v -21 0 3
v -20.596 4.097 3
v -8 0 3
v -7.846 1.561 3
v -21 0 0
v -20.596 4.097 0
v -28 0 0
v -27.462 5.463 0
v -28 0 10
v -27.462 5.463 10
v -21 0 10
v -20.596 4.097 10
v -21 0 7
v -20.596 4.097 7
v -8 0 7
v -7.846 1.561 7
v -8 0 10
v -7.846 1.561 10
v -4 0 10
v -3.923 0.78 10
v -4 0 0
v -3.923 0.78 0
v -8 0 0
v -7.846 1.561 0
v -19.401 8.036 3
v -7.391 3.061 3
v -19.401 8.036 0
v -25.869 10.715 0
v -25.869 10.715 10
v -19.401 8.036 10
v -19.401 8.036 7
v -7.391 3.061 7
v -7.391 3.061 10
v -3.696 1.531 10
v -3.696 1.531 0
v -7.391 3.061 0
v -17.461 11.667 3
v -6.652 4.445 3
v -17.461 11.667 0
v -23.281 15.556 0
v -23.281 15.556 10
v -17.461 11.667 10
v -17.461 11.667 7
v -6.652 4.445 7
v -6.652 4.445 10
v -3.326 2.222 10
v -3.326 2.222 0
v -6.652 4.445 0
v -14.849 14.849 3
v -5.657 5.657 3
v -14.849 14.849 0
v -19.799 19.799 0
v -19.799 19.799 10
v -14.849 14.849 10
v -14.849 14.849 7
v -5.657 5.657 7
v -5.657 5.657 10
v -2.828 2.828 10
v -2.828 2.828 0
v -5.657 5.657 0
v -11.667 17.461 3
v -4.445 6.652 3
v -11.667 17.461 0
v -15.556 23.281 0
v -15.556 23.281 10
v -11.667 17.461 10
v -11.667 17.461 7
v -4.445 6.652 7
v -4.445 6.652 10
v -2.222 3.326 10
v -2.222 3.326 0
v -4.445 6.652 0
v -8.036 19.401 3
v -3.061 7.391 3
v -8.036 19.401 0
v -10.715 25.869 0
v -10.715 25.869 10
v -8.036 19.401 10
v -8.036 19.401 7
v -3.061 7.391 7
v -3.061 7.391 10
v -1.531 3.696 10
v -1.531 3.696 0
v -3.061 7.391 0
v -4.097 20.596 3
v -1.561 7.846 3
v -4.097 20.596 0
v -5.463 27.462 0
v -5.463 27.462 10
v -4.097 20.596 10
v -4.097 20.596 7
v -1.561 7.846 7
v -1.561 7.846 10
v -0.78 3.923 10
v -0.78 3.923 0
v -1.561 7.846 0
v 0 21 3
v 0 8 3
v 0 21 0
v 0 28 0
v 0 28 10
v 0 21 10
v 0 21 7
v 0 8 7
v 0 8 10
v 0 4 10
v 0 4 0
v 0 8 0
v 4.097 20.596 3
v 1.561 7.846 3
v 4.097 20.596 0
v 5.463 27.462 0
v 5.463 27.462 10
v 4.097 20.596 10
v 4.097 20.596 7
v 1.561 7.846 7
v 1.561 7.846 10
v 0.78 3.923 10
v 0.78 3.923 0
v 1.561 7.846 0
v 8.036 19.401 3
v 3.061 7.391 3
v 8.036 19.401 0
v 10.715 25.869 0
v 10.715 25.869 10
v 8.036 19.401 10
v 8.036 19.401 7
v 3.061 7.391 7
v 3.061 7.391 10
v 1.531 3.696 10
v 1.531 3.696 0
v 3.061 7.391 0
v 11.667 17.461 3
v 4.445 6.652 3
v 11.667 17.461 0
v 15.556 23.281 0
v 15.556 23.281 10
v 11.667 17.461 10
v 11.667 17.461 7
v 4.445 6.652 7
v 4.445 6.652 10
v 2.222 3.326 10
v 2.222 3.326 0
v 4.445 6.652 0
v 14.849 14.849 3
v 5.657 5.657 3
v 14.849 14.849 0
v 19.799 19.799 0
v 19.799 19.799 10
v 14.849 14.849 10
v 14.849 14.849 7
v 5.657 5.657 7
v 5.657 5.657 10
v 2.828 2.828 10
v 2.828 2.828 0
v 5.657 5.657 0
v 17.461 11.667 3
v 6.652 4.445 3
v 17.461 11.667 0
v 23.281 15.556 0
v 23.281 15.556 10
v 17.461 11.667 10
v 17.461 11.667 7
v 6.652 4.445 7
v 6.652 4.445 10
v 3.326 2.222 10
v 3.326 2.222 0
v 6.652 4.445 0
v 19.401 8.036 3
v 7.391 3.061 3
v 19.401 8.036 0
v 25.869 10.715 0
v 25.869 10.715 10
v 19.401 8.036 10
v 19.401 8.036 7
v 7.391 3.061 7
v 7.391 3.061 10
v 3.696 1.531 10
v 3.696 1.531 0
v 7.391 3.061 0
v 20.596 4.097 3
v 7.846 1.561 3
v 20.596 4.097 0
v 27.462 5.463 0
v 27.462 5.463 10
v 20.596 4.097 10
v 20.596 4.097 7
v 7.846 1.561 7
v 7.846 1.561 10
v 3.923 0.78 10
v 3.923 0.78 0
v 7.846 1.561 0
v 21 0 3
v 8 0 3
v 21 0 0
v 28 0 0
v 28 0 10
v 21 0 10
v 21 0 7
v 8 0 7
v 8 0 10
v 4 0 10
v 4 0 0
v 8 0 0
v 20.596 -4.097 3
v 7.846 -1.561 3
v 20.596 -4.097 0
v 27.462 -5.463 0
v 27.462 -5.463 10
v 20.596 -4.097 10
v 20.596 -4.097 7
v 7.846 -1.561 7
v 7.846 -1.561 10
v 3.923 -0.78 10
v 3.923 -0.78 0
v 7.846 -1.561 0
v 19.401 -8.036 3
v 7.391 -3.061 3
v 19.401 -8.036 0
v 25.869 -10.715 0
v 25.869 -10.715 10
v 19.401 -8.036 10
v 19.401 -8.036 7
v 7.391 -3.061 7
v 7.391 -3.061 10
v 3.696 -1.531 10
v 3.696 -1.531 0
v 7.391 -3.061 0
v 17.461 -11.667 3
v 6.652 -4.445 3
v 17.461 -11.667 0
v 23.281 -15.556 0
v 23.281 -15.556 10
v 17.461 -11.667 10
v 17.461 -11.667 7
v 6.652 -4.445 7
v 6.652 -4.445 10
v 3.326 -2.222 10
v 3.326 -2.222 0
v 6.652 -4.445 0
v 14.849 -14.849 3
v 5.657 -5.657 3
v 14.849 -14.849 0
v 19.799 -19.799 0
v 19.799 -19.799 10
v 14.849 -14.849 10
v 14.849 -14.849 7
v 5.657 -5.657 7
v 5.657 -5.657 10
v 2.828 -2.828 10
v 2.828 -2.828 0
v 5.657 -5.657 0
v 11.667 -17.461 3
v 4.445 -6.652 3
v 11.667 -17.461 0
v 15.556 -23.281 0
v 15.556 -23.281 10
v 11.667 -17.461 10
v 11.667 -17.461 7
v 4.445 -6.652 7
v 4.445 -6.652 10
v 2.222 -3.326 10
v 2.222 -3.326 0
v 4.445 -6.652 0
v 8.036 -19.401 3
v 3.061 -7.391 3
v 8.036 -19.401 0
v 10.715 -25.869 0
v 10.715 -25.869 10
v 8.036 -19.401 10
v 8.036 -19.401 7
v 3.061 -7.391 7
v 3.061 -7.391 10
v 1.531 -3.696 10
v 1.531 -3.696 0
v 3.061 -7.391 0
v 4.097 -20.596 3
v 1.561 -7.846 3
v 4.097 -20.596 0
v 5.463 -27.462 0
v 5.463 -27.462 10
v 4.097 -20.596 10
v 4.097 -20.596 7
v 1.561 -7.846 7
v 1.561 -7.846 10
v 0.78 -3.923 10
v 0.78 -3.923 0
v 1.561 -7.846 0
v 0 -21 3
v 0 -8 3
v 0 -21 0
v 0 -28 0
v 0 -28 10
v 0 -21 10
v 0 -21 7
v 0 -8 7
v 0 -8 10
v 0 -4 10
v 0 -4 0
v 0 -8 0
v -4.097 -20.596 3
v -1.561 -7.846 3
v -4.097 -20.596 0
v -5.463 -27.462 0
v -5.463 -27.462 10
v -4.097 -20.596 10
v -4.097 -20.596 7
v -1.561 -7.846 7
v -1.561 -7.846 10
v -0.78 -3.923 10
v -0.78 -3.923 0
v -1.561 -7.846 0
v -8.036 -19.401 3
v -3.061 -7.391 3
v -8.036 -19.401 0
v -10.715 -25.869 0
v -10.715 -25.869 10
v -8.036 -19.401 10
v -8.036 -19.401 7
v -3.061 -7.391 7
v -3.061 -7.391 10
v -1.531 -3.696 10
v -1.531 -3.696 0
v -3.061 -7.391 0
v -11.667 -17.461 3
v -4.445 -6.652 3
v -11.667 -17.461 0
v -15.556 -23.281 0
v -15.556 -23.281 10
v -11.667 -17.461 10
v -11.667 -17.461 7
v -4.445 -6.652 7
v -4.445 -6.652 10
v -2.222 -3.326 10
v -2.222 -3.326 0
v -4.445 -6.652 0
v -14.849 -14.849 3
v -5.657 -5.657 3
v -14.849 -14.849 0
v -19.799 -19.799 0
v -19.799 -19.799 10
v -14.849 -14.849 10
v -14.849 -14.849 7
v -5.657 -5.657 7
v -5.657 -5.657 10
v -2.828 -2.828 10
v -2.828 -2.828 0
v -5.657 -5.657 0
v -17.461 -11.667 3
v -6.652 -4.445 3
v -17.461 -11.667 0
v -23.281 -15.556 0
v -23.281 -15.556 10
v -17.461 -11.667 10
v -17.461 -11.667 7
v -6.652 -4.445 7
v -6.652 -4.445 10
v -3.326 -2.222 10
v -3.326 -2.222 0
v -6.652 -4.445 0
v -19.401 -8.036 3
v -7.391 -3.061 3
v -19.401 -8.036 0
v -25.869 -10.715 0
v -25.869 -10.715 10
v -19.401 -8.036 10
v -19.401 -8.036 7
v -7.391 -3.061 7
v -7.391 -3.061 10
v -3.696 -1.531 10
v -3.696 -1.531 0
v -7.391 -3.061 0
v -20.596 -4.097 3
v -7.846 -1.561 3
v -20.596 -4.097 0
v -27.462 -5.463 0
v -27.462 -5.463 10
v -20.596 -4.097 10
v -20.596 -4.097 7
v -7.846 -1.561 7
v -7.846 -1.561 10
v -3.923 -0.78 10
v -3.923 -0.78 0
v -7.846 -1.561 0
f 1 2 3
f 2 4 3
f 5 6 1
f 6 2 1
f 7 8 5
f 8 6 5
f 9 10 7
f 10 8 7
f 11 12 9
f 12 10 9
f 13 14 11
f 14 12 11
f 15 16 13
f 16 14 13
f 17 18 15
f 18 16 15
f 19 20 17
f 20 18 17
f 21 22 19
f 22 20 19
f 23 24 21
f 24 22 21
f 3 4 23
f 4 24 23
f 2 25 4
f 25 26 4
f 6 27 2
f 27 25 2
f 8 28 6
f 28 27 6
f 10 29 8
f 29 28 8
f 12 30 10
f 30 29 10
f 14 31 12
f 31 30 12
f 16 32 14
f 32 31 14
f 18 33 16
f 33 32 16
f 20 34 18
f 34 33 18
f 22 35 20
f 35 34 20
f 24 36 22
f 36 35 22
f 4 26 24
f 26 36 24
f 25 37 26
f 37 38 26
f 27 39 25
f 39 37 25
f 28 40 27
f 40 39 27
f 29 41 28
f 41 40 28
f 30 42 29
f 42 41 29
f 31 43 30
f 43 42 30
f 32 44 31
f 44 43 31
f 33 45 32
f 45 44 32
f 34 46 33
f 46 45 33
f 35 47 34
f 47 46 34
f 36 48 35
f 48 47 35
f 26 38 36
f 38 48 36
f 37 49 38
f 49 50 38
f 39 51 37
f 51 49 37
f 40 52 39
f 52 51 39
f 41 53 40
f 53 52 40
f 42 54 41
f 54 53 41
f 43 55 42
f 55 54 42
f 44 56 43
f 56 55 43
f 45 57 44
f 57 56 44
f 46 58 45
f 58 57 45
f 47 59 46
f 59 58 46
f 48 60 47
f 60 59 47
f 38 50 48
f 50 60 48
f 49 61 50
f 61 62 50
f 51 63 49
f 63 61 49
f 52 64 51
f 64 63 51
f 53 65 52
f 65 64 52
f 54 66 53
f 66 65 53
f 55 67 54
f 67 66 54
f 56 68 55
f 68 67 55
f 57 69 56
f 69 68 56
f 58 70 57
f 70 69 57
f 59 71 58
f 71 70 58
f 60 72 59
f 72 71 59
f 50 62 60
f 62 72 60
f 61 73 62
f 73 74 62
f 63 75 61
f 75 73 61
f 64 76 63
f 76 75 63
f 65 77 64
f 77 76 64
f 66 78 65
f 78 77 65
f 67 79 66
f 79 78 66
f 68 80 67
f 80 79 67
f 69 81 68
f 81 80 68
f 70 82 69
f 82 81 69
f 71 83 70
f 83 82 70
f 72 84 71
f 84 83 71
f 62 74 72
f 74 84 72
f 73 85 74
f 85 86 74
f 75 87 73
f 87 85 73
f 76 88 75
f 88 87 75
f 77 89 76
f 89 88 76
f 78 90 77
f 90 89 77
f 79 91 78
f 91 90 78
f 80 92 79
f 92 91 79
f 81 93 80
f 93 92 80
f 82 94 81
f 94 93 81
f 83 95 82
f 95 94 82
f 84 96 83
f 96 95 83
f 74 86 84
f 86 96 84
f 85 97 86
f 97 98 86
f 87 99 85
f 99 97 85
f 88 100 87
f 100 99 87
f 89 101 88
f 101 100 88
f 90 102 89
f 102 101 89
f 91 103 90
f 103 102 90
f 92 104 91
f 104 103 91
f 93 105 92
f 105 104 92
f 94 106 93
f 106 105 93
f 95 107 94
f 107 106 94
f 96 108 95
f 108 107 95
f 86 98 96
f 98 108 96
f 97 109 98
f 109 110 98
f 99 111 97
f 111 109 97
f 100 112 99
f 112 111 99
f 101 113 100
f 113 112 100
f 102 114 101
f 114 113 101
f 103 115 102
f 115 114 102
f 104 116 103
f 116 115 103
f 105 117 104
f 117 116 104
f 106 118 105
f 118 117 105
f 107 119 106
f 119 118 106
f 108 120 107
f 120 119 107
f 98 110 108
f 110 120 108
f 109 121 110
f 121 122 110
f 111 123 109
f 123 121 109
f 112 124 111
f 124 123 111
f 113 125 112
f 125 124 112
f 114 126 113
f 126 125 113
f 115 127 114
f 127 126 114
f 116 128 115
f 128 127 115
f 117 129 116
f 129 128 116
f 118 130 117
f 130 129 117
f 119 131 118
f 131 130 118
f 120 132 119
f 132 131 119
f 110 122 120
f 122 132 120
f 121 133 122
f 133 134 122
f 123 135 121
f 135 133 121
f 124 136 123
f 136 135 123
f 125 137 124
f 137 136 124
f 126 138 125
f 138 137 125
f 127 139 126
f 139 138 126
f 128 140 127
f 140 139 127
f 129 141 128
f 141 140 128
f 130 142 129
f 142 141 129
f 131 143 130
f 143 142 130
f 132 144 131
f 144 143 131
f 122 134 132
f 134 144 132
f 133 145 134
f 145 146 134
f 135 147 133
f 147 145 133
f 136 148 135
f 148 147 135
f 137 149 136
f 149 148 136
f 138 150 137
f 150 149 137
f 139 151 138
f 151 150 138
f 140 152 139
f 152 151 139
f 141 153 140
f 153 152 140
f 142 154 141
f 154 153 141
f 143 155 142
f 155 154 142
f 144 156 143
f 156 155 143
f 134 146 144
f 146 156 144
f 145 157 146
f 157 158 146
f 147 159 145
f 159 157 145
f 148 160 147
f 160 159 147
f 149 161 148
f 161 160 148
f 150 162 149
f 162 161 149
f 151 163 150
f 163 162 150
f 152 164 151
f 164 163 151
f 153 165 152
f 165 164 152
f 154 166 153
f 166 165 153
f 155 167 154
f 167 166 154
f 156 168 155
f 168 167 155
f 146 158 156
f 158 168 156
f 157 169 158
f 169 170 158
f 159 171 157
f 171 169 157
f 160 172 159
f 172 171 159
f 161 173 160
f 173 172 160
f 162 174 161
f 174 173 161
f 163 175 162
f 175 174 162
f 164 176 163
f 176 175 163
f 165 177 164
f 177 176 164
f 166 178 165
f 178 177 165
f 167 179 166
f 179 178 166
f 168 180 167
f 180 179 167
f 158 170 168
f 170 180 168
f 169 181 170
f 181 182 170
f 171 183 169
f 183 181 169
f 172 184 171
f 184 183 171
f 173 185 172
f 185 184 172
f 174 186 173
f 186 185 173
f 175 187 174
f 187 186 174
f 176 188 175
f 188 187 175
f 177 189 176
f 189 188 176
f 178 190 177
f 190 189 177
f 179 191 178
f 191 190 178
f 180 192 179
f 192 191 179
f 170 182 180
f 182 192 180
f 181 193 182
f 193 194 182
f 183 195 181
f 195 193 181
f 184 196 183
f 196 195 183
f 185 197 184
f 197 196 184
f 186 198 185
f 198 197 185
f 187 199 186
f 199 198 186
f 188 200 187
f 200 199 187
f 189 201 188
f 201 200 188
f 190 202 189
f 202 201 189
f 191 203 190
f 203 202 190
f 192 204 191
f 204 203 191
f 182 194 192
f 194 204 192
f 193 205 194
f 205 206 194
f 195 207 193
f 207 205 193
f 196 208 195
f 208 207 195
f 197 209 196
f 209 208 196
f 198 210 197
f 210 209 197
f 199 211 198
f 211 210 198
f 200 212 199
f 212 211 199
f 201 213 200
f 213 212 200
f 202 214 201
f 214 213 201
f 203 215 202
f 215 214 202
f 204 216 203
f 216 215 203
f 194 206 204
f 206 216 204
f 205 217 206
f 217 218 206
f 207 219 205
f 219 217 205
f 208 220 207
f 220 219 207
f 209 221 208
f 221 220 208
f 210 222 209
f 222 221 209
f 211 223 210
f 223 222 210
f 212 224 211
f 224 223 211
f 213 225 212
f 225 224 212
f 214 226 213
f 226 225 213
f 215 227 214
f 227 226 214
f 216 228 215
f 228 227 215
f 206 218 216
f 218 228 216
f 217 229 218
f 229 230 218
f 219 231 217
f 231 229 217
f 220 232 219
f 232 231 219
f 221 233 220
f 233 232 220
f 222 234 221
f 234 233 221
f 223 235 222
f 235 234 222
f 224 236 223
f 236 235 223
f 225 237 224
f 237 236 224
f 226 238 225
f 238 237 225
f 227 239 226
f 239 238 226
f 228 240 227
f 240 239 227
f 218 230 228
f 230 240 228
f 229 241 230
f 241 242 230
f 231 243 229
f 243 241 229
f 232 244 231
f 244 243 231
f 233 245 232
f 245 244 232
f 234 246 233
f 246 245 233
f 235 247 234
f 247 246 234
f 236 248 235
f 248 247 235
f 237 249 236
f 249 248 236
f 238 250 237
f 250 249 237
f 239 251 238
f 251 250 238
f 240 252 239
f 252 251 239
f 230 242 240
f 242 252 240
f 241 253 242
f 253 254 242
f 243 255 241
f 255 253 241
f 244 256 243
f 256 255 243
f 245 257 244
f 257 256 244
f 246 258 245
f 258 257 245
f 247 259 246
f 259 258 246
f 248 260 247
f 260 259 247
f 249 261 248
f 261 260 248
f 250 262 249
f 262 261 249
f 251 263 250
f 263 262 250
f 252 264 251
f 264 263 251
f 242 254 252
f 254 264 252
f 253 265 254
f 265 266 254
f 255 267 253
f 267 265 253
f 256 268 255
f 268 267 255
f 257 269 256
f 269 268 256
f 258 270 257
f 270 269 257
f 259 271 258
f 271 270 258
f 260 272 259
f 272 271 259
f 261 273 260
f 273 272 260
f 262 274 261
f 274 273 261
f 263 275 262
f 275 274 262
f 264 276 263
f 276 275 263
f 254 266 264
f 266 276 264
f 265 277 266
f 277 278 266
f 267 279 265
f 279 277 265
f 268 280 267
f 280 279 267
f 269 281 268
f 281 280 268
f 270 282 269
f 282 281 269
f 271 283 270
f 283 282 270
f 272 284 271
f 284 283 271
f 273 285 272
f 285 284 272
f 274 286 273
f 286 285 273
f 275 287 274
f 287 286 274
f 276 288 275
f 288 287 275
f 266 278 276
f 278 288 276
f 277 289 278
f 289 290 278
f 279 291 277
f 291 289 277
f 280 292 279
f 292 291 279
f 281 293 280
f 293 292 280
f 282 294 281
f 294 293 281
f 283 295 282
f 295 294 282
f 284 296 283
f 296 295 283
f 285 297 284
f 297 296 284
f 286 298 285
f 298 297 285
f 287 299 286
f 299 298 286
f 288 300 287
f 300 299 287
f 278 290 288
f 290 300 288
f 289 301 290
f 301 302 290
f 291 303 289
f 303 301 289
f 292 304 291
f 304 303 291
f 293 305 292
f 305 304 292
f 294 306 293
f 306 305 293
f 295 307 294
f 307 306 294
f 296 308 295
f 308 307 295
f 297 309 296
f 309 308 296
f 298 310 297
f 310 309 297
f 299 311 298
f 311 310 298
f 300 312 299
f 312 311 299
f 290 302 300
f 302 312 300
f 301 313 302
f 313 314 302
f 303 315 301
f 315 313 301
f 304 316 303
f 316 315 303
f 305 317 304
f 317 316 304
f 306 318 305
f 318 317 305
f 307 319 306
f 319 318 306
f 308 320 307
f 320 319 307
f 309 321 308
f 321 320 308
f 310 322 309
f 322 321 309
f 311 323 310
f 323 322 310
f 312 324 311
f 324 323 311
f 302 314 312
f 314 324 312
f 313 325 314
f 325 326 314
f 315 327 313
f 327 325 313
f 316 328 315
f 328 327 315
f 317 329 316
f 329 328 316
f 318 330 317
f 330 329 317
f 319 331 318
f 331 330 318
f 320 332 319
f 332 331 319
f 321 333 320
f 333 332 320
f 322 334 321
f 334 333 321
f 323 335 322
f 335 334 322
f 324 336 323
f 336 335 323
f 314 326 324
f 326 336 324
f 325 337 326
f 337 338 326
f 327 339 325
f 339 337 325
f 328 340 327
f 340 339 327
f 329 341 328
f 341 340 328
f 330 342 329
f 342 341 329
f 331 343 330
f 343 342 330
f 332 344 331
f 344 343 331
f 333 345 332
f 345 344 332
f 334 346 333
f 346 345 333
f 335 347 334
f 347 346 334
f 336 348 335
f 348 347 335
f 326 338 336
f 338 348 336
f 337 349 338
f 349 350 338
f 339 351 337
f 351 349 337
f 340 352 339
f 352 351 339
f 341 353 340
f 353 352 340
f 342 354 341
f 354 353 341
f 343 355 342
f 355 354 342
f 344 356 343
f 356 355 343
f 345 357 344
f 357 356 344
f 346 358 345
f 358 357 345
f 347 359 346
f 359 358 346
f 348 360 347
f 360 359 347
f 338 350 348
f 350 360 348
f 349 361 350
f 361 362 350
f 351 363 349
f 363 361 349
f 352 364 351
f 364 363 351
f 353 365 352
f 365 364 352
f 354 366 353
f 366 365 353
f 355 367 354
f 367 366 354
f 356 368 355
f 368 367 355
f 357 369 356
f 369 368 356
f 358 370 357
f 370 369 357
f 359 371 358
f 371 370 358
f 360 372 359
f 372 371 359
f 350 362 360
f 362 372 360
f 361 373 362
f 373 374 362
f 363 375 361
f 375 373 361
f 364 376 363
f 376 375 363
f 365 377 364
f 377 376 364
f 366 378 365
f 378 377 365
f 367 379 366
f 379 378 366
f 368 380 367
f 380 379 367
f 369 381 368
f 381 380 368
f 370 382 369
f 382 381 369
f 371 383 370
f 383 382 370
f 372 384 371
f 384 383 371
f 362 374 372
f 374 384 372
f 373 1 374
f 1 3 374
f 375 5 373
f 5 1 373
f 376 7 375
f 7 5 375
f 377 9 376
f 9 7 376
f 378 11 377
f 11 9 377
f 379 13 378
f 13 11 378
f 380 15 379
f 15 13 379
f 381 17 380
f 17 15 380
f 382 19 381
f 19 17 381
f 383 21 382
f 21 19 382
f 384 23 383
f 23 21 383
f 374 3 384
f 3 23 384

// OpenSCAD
$fn = 32;

// ----------------------------------------------------------------------
// Revolved part: handwheel R28
// ----------------------------------------------------------------------

// --- parameters (mm) ---
bore_r = 4;               // bore radius
rim_r = 28;               // rim radius
rim_w = 7;                // rim axial width
rim_t = 10;               // rim diameter height
hub_r = 8;                // hub radius
web_t = 4;                // web thickness
revolve_angle = 360;      // revolve sweep, degrees

bore_d = 2 * bore_r;
rim_d = 2 * rim_r;
hub_d = 2 * hub_r;

profile = [[4, 0], [8, 0], [8, 3], [21, 3], [21, 0], [28, 0], [28, 10], [21, 10], [21, 7], [8, 7], [8, 10], [4, 10]];  // primary outline, 12 points, counter clockwise

// --- the one profile operation ---
rotate_extrude(angle = revolve_angle) polygon(points = profile);
